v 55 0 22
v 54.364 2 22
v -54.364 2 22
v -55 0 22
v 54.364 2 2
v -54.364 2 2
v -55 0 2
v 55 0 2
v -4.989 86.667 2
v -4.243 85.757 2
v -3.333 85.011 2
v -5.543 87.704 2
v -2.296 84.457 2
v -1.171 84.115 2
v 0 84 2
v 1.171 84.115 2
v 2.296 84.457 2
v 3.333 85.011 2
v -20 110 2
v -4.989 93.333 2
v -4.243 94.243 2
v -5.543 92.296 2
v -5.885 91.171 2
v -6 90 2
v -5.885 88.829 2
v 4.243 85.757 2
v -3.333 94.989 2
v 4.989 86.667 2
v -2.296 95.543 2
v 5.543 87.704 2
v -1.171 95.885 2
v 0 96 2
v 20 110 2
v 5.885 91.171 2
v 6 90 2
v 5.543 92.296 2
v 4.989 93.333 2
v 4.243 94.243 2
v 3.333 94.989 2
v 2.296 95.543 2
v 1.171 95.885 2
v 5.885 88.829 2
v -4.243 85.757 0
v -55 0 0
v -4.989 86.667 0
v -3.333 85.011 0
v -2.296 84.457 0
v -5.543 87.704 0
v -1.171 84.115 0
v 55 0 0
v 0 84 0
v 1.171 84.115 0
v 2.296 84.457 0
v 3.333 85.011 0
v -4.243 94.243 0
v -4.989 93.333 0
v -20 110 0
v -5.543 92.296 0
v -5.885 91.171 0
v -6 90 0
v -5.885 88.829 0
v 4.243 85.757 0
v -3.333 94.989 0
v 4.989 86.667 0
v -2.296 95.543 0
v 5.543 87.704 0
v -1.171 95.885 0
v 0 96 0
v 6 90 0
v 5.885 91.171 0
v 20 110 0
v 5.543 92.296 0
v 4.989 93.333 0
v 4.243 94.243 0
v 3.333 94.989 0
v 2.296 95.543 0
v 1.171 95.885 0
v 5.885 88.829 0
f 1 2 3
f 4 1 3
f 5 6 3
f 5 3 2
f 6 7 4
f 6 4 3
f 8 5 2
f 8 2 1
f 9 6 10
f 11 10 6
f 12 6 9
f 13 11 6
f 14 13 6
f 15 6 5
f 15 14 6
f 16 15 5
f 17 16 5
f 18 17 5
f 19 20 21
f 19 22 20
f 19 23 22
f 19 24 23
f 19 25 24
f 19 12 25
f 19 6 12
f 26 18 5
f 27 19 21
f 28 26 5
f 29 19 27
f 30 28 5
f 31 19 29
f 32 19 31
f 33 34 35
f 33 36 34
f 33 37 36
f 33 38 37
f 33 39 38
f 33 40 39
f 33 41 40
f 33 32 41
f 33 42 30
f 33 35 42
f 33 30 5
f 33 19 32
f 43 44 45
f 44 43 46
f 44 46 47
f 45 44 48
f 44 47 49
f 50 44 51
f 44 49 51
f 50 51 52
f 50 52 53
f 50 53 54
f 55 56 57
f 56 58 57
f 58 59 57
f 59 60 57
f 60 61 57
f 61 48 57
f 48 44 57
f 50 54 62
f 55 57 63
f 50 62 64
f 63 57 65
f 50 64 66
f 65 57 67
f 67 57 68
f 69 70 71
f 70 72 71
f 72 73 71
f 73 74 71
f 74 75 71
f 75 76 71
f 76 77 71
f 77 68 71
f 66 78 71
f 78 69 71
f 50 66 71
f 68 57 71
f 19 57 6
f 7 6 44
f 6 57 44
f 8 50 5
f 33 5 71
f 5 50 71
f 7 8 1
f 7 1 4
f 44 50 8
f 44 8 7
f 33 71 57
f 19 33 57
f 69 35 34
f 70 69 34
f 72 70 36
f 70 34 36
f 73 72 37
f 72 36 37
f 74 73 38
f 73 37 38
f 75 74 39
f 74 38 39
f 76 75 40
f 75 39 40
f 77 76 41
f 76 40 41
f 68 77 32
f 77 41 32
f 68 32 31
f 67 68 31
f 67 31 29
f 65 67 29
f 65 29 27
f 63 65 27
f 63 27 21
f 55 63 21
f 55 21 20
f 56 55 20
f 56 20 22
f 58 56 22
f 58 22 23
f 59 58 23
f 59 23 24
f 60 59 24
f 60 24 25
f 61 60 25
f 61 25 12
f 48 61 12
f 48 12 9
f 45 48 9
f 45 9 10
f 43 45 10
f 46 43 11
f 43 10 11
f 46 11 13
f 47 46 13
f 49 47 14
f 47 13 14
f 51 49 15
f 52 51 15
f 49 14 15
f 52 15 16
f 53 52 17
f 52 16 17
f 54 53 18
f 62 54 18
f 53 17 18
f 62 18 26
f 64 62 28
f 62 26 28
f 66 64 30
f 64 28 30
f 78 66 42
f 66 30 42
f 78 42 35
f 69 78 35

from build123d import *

# Parameters (mm, degrees)
BOSS_EXTRUDE1_DEPTH = 2
SKETCH2_R           = 6
CUT_EXTRUDE1_DEPTH  = 124
BOSS_EXTRUDE2_DEPTH = 20


with BuildPart() as part:
    # Sketch1 → Boss-Extrude1 (new body)
    with BuildSketch(Plane.XY):
        Polygon((-55, 0), (55, 0), (20, 110), (-20, 110), align=None)
    extrude(amount=BOSS_EXTRUDE1_DEPTH)

    # Sketch2 → Cut-Extrude1 (cut, through all)
    with BuildSketch(Plane.XY.offset(2)):
        with Locations((0, 90)):
            Circle(SKETCH2_R)
    extrude(amount=-CUT_EXTRUDE1_DEPTH, mode=Mode.SUBTRACT)

    # Sketch4 → Boss-Extrude2 (add)
    with BuildSketch(Plane.XY.offset(2)):
        Polygon((-55, 0), (-54.363636364, 2), (54.363636364, 2), (55, 0), align=None)
    extrude(amount=BOSS_EXTRUDE2_DEPTH)


solid = part.part
